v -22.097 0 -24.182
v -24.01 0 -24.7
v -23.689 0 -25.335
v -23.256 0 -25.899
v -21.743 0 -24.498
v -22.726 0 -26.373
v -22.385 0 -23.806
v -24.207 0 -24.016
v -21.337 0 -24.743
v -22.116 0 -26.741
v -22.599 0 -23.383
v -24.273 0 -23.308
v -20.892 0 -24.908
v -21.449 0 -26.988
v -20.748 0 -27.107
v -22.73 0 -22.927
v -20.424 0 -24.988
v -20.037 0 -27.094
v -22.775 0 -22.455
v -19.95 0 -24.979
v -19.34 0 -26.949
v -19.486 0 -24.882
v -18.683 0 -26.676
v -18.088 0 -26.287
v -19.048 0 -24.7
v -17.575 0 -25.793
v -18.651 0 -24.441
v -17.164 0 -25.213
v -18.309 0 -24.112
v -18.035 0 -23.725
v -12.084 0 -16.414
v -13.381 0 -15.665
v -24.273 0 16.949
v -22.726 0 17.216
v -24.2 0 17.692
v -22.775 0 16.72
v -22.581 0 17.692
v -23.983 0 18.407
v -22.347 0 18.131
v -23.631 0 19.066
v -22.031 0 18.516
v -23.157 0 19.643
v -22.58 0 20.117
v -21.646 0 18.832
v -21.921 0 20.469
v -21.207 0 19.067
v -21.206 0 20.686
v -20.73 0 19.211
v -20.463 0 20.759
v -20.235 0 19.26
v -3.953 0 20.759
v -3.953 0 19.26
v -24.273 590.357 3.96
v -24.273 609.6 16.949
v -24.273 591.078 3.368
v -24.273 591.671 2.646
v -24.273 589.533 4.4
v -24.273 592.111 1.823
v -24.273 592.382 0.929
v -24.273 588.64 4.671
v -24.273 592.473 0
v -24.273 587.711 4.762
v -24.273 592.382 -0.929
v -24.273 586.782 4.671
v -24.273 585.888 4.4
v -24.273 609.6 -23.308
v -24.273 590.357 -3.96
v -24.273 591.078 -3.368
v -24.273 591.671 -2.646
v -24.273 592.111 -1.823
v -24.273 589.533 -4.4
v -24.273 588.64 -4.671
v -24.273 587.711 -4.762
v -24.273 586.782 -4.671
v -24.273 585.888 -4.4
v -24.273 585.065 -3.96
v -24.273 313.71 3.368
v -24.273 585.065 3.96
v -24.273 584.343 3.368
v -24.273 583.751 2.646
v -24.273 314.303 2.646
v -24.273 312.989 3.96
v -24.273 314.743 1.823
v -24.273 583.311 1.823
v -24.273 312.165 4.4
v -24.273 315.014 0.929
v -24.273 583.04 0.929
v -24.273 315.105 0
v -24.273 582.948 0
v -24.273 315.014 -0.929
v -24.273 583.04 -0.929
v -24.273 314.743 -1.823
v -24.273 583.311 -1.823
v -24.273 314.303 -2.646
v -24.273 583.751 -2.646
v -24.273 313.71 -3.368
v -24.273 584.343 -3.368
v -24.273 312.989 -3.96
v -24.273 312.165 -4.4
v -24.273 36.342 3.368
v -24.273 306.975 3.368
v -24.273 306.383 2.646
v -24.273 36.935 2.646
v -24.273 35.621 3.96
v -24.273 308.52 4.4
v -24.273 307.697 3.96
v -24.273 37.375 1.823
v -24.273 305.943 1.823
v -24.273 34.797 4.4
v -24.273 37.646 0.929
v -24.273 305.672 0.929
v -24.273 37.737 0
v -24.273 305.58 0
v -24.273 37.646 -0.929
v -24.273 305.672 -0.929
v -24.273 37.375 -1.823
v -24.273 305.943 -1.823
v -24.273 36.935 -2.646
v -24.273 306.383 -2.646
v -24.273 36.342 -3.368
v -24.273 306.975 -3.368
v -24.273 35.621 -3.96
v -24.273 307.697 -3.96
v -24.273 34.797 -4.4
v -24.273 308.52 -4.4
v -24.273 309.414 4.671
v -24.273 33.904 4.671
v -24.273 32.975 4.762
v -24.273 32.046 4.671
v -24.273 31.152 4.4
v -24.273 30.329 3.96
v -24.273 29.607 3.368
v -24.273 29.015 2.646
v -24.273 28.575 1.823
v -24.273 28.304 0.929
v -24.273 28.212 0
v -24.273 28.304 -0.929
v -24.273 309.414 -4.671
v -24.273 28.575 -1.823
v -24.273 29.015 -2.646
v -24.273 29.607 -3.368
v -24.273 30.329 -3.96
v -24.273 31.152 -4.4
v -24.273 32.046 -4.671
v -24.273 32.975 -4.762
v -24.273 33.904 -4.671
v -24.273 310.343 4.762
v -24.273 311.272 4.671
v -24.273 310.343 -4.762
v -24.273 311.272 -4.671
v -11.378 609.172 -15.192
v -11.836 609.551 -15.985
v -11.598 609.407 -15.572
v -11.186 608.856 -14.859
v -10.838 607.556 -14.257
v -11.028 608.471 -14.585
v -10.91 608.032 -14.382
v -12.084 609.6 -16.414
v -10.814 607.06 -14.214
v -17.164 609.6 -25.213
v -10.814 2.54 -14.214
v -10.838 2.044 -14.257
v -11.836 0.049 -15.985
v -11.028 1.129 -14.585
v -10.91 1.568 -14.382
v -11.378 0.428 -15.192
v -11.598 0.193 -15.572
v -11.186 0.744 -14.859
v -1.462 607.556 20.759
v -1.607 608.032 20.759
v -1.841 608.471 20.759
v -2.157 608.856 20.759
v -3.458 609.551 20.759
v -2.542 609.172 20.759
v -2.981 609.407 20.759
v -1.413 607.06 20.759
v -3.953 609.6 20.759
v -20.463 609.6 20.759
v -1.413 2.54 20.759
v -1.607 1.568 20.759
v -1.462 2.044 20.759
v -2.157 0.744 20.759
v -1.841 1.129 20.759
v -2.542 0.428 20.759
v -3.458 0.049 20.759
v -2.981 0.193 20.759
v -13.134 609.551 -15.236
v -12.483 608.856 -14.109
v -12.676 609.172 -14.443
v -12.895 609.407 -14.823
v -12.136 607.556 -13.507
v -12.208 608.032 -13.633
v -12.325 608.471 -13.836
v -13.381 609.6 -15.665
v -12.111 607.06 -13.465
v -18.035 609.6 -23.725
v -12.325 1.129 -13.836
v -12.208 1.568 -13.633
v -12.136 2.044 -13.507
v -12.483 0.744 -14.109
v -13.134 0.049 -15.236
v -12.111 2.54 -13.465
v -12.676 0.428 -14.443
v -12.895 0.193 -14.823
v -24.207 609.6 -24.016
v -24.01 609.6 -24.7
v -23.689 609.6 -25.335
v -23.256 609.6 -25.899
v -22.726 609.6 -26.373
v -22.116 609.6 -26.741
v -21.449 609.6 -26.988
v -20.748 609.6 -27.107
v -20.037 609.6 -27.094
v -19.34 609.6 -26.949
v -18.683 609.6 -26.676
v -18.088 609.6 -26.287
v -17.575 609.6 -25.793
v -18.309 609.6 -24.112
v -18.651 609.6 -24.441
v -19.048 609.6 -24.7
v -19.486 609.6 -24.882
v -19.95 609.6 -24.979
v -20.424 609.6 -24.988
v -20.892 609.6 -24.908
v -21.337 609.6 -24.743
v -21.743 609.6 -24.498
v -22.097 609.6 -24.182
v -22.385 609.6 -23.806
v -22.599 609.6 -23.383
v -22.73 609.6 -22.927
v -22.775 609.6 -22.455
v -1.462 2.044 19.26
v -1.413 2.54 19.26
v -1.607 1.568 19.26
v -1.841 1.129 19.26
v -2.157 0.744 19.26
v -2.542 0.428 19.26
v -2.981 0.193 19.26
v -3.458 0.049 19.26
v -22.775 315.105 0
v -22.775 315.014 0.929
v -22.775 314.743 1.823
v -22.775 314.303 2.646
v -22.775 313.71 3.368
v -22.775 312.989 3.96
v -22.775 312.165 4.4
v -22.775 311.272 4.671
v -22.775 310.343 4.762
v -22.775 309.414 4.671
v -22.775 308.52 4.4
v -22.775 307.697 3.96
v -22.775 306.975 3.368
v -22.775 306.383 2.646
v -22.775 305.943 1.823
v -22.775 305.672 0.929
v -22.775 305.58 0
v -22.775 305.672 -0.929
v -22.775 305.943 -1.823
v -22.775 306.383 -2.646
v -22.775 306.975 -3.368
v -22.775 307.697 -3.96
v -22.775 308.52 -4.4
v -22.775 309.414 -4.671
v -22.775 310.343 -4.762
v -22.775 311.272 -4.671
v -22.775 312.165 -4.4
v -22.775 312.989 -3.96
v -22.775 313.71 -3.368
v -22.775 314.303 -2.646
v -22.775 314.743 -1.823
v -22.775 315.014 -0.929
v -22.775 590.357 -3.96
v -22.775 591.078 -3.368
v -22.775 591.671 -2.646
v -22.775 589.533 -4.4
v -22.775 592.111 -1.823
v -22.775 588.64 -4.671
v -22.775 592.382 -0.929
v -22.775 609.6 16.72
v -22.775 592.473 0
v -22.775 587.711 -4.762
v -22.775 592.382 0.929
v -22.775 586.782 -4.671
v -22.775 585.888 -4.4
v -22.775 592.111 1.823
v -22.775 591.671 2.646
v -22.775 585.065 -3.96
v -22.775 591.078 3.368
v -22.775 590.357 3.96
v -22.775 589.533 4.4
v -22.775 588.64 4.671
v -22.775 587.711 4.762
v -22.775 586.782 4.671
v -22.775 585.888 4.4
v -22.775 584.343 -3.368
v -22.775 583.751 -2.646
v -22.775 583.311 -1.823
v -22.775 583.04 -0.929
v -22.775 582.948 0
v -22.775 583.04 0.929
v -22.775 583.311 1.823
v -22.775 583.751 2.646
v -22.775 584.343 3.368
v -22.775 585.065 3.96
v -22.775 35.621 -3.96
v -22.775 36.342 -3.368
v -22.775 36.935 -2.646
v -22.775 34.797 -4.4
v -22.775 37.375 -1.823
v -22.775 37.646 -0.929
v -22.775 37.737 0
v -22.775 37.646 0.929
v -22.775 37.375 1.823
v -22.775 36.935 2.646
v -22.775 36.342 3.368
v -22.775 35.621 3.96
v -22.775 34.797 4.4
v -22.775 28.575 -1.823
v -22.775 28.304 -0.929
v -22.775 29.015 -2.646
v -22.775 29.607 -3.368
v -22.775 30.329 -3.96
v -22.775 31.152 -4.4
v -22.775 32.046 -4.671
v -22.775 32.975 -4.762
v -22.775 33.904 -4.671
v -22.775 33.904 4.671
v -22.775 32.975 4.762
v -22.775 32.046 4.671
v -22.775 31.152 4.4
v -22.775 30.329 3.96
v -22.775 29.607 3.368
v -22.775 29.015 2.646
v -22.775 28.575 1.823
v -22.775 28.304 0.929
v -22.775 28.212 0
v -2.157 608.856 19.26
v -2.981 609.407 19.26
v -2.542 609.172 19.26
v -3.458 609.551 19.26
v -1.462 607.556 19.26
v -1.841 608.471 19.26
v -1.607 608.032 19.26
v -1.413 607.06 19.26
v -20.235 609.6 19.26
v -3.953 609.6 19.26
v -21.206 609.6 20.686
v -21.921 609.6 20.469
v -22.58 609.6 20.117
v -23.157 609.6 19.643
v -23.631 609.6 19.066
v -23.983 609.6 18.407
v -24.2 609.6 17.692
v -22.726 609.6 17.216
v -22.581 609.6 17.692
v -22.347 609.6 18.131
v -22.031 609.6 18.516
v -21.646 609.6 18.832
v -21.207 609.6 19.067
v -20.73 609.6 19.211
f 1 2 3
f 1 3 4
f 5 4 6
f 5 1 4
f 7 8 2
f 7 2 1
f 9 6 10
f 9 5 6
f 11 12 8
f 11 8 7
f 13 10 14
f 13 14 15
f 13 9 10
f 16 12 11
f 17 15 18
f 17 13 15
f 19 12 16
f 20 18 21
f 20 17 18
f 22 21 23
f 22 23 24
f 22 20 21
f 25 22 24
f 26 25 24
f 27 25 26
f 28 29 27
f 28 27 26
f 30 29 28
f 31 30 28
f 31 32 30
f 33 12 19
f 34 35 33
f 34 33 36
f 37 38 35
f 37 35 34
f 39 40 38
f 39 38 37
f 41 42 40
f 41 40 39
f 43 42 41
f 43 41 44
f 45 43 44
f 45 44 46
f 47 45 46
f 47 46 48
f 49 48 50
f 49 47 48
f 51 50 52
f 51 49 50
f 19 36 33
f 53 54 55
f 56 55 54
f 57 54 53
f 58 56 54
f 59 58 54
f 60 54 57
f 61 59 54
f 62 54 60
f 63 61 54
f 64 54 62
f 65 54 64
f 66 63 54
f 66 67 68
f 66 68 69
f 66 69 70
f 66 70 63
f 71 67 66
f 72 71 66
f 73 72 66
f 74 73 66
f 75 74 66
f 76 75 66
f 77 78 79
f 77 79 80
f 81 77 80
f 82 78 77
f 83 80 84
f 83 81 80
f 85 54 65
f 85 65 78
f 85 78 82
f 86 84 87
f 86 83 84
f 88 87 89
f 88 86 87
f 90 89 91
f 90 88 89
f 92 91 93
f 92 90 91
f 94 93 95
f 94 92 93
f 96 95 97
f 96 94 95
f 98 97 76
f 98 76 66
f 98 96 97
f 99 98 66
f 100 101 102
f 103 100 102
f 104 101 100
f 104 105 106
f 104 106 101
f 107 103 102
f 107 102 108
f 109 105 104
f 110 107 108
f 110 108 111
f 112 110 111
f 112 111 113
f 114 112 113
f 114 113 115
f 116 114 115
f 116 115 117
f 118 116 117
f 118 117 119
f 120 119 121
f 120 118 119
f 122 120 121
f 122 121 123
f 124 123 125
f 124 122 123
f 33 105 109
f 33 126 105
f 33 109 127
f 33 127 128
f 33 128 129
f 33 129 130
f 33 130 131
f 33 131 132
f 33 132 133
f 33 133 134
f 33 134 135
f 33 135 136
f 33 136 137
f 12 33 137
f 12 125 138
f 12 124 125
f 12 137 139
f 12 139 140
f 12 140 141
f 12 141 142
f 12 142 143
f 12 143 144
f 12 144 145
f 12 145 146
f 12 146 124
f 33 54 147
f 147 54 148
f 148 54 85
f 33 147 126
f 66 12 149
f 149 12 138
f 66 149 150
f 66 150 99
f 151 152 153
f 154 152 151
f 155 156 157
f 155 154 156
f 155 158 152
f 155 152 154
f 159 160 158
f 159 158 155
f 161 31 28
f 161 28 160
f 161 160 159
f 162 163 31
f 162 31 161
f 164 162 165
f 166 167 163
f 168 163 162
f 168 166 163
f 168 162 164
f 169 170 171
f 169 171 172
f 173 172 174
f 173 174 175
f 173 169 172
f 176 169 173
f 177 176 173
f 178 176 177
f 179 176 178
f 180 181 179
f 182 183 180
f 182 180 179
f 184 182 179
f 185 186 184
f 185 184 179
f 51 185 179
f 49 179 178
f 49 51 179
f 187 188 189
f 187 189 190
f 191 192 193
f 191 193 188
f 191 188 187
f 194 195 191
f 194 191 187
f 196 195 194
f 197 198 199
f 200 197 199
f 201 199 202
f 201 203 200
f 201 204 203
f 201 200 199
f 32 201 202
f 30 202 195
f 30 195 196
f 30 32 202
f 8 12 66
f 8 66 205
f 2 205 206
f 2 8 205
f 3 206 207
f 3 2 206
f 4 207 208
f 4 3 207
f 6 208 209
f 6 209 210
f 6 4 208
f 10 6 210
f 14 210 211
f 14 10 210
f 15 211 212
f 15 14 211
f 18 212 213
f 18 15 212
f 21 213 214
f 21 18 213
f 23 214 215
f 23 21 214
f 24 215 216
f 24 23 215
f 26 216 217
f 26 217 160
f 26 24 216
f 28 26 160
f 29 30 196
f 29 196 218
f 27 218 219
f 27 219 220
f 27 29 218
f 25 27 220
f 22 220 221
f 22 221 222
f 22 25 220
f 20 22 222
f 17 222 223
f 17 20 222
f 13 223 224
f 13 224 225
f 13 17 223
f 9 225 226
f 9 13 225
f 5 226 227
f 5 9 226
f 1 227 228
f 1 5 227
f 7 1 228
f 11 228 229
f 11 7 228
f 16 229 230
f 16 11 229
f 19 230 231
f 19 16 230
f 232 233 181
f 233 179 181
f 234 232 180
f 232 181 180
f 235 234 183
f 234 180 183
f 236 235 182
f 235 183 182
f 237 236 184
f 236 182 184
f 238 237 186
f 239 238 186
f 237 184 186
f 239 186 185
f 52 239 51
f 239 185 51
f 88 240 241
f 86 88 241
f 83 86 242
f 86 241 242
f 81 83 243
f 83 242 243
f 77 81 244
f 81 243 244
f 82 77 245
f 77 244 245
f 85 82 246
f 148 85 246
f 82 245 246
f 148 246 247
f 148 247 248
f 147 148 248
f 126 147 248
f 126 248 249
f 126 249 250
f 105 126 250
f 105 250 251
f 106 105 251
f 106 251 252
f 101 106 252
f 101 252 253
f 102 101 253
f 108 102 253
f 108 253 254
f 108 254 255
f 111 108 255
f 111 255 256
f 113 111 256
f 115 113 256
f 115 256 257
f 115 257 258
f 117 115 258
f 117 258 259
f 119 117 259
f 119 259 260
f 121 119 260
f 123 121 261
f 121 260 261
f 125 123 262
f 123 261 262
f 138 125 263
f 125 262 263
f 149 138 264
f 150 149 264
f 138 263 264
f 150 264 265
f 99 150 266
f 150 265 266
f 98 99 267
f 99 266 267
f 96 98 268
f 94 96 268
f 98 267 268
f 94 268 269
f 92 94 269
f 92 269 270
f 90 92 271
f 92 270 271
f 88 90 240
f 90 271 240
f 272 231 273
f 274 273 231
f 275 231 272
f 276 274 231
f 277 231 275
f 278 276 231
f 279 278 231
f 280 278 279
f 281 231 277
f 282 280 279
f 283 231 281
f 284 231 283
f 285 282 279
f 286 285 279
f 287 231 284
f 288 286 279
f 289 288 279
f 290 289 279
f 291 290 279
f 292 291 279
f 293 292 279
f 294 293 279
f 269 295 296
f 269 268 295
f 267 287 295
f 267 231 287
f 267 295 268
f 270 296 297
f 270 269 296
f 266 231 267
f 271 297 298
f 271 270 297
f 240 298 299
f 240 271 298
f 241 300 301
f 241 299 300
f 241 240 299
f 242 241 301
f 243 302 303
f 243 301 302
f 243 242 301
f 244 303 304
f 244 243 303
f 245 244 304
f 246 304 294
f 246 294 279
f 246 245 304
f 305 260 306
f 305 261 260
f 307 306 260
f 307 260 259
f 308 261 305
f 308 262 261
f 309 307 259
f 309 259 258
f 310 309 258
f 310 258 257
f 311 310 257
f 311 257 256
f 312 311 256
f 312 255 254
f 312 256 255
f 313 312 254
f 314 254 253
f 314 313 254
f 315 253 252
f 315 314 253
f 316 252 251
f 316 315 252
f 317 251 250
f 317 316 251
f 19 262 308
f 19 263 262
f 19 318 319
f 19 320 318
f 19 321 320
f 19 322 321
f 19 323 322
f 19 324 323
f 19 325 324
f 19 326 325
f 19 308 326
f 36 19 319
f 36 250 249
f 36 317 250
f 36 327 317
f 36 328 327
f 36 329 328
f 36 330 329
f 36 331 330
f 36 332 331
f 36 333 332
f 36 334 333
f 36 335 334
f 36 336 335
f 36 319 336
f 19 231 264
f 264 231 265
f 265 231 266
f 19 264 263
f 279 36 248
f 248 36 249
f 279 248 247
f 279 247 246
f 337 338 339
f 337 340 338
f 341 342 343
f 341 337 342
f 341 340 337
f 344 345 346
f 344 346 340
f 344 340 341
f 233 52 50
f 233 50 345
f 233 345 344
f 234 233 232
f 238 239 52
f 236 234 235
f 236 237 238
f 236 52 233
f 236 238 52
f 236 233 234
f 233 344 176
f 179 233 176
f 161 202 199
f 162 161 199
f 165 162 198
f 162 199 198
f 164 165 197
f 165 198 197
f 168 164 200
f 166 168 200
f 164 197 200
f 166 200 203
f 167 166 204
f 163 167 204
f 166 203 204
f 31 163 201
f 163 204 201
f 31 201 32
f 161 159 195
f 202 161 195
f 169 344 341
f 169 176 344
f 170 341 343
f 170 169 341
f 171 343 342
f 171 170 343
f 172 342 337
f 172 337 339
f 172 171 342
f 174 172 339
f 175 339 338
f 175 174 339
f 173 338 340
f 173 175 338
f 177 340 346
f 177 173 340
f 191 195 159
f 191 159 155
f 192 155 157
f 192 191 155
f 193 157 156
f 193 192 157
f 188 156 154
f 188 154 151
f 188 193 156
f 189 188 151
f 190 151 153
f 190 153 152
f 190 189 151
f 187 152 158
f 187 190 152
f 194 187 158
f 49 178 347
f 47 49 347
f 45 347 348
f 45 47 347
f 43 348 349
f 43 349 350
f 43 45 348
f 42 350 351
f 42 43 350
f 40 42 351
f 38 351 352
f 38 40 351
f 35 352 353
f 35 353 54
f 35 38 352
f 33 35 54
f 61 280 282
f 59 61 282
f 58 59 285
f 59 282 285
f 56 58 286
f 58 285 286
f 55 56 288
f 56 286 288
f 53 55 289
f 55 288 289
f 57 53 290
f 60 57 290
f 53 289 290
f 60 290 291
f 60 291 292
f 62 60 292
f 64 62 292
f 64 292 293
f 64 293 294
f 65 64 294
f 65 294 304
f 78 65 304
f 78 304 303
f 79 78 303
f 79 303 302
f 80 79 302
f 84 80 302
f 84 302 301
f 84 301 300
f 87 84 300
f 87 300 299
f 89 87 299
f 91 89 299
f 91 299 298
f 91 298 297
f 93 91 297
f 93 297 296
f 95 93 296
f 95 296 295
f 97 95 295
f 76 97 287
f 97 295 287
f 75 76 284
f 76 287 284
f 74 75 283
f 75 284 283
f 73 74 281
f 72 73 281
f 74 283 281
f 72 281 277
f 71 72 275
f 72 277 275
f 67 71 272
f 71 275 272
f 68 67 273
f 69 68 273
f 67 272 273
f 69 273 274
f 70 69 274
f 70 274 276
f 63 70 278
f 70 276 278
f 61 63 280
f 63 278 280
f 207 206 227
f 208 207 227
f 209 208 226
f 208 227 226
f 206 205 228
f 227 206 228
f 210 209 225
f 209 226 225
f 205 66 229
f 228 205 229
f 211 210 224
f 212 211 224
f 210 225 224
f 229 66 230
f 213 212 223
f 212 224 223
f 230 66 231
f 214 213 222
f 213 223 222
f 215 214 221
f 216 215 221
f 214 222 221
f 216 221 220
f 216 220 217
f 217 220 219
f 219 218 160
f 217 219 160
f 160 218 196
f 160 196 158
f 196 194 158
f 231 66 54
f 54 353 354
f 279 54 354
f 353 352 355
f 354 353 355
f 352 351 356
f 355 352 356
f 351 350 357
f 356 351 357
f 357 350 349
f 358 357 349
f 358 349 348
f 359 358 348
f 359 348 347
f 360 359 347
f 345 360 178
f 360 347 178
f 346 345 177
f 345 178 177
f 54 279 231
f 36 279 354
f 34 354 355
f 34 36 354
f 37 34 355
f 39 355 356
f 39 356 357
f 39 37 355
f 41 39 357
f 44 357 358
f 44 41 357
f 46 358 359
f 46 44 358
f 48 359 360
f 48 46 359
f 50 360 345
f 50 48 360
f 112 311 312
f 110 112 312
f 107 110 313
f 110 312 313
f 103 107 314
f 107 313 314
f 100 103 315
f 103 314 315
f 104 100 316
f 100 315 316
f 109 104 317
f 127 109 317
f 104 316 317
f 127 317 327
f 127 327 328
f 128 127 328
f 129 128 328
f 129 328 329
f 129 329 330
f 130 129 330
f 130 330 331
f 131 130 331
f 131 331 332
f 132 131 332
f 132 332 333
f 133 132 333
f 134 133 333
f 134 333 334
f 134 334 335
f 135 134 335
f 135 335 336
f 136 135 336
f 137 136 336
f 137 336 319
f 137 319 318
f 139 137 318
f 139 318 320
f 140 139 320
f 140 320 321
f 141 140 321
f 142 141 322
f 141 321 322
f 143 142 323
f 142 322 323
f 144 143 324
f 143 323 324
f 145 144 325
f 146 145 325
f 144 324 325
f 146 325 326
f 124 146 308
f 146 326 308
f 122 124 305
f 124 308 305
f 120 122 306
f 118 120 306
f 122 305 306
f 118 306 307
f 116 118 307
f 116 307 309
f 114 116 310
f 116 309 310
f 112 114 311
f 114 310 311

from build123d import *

# Parameters (mm, degrees)
F1_DEPTH = 609.6
F3_R     = 2.54
F4_R     = 4.7625
F5_DEPTH = 25.4


with BuildPart() as f1:
    # F0 (on Front) → F1 (new body)
    with BuildSketch(Plane.XZ):
        with BuildLine():
            Line((-20.234578, 19.260229), (-1.413178, 19.260229))
            Line((-1.413178, 19.260229), (-1.413178, 20.758829))
            Line((-1.413178, 20.758829), (-20.463178, 20.758829))
            ThreePointArc((-20.463178, 20.758829), (-23.157255, 19.642906), (-24.273178, 16.948829))
            Line((-24.273178, 16.948829), (-24.273178, -23.307944))
            ThreePointArc((-24.273178, -23.307944), (-21.449279, -26.988121), (-17.163621, -25.212944))
            Line((-17.163621, -25.212944), (-10.813621, -14.214421))
            Line((-10.813621, -14.214421), (-12.111447, -13.465121))
            Line((-12.111447, -13.465121), (-18.034874, -23.724797))
            ThreePointArc((-18.034874, -23.724797), (-20.891979, -24.908249), (-22.774578, -22.454797))
            Line((-22.774578, -22.454797), (-22.774578, 16.720229))
            ThreePointArc((-22.774578, 16.720229), (-22.030629, 18.51628), (-20.234578, 19.260229))
        make_face()
    extrude(amount=-F1_DEPTH)

    # F3
    f3_edges = [f1.edges().sort_by_distance(p)[0] for p in [
        (-1.413178, 0, 20.009529),
        (-11.462534, 0, -13.839771),
        (-11.462534, 609.6, -13.839771),
        (-1.413178, 609.6, 20.009529),
    ]]
    fillet(f3_edges, radius=F3_R)

    # F4 (on face) → F5 (cut)
    with BuildSketch(Plane.YZ.offset(-22.774578)):
        with Locations((32.974709, 0)):
            Circle(F4_R)
        with Locations((310.342709, 0)):
            Circle(F4_R)
        with Locations((587.710709, 0)):
            Circle(F4_R)
    extrude(amount=-F5_DEPTH, mode=Mode.SUBTRACT)


solid = f1.part
